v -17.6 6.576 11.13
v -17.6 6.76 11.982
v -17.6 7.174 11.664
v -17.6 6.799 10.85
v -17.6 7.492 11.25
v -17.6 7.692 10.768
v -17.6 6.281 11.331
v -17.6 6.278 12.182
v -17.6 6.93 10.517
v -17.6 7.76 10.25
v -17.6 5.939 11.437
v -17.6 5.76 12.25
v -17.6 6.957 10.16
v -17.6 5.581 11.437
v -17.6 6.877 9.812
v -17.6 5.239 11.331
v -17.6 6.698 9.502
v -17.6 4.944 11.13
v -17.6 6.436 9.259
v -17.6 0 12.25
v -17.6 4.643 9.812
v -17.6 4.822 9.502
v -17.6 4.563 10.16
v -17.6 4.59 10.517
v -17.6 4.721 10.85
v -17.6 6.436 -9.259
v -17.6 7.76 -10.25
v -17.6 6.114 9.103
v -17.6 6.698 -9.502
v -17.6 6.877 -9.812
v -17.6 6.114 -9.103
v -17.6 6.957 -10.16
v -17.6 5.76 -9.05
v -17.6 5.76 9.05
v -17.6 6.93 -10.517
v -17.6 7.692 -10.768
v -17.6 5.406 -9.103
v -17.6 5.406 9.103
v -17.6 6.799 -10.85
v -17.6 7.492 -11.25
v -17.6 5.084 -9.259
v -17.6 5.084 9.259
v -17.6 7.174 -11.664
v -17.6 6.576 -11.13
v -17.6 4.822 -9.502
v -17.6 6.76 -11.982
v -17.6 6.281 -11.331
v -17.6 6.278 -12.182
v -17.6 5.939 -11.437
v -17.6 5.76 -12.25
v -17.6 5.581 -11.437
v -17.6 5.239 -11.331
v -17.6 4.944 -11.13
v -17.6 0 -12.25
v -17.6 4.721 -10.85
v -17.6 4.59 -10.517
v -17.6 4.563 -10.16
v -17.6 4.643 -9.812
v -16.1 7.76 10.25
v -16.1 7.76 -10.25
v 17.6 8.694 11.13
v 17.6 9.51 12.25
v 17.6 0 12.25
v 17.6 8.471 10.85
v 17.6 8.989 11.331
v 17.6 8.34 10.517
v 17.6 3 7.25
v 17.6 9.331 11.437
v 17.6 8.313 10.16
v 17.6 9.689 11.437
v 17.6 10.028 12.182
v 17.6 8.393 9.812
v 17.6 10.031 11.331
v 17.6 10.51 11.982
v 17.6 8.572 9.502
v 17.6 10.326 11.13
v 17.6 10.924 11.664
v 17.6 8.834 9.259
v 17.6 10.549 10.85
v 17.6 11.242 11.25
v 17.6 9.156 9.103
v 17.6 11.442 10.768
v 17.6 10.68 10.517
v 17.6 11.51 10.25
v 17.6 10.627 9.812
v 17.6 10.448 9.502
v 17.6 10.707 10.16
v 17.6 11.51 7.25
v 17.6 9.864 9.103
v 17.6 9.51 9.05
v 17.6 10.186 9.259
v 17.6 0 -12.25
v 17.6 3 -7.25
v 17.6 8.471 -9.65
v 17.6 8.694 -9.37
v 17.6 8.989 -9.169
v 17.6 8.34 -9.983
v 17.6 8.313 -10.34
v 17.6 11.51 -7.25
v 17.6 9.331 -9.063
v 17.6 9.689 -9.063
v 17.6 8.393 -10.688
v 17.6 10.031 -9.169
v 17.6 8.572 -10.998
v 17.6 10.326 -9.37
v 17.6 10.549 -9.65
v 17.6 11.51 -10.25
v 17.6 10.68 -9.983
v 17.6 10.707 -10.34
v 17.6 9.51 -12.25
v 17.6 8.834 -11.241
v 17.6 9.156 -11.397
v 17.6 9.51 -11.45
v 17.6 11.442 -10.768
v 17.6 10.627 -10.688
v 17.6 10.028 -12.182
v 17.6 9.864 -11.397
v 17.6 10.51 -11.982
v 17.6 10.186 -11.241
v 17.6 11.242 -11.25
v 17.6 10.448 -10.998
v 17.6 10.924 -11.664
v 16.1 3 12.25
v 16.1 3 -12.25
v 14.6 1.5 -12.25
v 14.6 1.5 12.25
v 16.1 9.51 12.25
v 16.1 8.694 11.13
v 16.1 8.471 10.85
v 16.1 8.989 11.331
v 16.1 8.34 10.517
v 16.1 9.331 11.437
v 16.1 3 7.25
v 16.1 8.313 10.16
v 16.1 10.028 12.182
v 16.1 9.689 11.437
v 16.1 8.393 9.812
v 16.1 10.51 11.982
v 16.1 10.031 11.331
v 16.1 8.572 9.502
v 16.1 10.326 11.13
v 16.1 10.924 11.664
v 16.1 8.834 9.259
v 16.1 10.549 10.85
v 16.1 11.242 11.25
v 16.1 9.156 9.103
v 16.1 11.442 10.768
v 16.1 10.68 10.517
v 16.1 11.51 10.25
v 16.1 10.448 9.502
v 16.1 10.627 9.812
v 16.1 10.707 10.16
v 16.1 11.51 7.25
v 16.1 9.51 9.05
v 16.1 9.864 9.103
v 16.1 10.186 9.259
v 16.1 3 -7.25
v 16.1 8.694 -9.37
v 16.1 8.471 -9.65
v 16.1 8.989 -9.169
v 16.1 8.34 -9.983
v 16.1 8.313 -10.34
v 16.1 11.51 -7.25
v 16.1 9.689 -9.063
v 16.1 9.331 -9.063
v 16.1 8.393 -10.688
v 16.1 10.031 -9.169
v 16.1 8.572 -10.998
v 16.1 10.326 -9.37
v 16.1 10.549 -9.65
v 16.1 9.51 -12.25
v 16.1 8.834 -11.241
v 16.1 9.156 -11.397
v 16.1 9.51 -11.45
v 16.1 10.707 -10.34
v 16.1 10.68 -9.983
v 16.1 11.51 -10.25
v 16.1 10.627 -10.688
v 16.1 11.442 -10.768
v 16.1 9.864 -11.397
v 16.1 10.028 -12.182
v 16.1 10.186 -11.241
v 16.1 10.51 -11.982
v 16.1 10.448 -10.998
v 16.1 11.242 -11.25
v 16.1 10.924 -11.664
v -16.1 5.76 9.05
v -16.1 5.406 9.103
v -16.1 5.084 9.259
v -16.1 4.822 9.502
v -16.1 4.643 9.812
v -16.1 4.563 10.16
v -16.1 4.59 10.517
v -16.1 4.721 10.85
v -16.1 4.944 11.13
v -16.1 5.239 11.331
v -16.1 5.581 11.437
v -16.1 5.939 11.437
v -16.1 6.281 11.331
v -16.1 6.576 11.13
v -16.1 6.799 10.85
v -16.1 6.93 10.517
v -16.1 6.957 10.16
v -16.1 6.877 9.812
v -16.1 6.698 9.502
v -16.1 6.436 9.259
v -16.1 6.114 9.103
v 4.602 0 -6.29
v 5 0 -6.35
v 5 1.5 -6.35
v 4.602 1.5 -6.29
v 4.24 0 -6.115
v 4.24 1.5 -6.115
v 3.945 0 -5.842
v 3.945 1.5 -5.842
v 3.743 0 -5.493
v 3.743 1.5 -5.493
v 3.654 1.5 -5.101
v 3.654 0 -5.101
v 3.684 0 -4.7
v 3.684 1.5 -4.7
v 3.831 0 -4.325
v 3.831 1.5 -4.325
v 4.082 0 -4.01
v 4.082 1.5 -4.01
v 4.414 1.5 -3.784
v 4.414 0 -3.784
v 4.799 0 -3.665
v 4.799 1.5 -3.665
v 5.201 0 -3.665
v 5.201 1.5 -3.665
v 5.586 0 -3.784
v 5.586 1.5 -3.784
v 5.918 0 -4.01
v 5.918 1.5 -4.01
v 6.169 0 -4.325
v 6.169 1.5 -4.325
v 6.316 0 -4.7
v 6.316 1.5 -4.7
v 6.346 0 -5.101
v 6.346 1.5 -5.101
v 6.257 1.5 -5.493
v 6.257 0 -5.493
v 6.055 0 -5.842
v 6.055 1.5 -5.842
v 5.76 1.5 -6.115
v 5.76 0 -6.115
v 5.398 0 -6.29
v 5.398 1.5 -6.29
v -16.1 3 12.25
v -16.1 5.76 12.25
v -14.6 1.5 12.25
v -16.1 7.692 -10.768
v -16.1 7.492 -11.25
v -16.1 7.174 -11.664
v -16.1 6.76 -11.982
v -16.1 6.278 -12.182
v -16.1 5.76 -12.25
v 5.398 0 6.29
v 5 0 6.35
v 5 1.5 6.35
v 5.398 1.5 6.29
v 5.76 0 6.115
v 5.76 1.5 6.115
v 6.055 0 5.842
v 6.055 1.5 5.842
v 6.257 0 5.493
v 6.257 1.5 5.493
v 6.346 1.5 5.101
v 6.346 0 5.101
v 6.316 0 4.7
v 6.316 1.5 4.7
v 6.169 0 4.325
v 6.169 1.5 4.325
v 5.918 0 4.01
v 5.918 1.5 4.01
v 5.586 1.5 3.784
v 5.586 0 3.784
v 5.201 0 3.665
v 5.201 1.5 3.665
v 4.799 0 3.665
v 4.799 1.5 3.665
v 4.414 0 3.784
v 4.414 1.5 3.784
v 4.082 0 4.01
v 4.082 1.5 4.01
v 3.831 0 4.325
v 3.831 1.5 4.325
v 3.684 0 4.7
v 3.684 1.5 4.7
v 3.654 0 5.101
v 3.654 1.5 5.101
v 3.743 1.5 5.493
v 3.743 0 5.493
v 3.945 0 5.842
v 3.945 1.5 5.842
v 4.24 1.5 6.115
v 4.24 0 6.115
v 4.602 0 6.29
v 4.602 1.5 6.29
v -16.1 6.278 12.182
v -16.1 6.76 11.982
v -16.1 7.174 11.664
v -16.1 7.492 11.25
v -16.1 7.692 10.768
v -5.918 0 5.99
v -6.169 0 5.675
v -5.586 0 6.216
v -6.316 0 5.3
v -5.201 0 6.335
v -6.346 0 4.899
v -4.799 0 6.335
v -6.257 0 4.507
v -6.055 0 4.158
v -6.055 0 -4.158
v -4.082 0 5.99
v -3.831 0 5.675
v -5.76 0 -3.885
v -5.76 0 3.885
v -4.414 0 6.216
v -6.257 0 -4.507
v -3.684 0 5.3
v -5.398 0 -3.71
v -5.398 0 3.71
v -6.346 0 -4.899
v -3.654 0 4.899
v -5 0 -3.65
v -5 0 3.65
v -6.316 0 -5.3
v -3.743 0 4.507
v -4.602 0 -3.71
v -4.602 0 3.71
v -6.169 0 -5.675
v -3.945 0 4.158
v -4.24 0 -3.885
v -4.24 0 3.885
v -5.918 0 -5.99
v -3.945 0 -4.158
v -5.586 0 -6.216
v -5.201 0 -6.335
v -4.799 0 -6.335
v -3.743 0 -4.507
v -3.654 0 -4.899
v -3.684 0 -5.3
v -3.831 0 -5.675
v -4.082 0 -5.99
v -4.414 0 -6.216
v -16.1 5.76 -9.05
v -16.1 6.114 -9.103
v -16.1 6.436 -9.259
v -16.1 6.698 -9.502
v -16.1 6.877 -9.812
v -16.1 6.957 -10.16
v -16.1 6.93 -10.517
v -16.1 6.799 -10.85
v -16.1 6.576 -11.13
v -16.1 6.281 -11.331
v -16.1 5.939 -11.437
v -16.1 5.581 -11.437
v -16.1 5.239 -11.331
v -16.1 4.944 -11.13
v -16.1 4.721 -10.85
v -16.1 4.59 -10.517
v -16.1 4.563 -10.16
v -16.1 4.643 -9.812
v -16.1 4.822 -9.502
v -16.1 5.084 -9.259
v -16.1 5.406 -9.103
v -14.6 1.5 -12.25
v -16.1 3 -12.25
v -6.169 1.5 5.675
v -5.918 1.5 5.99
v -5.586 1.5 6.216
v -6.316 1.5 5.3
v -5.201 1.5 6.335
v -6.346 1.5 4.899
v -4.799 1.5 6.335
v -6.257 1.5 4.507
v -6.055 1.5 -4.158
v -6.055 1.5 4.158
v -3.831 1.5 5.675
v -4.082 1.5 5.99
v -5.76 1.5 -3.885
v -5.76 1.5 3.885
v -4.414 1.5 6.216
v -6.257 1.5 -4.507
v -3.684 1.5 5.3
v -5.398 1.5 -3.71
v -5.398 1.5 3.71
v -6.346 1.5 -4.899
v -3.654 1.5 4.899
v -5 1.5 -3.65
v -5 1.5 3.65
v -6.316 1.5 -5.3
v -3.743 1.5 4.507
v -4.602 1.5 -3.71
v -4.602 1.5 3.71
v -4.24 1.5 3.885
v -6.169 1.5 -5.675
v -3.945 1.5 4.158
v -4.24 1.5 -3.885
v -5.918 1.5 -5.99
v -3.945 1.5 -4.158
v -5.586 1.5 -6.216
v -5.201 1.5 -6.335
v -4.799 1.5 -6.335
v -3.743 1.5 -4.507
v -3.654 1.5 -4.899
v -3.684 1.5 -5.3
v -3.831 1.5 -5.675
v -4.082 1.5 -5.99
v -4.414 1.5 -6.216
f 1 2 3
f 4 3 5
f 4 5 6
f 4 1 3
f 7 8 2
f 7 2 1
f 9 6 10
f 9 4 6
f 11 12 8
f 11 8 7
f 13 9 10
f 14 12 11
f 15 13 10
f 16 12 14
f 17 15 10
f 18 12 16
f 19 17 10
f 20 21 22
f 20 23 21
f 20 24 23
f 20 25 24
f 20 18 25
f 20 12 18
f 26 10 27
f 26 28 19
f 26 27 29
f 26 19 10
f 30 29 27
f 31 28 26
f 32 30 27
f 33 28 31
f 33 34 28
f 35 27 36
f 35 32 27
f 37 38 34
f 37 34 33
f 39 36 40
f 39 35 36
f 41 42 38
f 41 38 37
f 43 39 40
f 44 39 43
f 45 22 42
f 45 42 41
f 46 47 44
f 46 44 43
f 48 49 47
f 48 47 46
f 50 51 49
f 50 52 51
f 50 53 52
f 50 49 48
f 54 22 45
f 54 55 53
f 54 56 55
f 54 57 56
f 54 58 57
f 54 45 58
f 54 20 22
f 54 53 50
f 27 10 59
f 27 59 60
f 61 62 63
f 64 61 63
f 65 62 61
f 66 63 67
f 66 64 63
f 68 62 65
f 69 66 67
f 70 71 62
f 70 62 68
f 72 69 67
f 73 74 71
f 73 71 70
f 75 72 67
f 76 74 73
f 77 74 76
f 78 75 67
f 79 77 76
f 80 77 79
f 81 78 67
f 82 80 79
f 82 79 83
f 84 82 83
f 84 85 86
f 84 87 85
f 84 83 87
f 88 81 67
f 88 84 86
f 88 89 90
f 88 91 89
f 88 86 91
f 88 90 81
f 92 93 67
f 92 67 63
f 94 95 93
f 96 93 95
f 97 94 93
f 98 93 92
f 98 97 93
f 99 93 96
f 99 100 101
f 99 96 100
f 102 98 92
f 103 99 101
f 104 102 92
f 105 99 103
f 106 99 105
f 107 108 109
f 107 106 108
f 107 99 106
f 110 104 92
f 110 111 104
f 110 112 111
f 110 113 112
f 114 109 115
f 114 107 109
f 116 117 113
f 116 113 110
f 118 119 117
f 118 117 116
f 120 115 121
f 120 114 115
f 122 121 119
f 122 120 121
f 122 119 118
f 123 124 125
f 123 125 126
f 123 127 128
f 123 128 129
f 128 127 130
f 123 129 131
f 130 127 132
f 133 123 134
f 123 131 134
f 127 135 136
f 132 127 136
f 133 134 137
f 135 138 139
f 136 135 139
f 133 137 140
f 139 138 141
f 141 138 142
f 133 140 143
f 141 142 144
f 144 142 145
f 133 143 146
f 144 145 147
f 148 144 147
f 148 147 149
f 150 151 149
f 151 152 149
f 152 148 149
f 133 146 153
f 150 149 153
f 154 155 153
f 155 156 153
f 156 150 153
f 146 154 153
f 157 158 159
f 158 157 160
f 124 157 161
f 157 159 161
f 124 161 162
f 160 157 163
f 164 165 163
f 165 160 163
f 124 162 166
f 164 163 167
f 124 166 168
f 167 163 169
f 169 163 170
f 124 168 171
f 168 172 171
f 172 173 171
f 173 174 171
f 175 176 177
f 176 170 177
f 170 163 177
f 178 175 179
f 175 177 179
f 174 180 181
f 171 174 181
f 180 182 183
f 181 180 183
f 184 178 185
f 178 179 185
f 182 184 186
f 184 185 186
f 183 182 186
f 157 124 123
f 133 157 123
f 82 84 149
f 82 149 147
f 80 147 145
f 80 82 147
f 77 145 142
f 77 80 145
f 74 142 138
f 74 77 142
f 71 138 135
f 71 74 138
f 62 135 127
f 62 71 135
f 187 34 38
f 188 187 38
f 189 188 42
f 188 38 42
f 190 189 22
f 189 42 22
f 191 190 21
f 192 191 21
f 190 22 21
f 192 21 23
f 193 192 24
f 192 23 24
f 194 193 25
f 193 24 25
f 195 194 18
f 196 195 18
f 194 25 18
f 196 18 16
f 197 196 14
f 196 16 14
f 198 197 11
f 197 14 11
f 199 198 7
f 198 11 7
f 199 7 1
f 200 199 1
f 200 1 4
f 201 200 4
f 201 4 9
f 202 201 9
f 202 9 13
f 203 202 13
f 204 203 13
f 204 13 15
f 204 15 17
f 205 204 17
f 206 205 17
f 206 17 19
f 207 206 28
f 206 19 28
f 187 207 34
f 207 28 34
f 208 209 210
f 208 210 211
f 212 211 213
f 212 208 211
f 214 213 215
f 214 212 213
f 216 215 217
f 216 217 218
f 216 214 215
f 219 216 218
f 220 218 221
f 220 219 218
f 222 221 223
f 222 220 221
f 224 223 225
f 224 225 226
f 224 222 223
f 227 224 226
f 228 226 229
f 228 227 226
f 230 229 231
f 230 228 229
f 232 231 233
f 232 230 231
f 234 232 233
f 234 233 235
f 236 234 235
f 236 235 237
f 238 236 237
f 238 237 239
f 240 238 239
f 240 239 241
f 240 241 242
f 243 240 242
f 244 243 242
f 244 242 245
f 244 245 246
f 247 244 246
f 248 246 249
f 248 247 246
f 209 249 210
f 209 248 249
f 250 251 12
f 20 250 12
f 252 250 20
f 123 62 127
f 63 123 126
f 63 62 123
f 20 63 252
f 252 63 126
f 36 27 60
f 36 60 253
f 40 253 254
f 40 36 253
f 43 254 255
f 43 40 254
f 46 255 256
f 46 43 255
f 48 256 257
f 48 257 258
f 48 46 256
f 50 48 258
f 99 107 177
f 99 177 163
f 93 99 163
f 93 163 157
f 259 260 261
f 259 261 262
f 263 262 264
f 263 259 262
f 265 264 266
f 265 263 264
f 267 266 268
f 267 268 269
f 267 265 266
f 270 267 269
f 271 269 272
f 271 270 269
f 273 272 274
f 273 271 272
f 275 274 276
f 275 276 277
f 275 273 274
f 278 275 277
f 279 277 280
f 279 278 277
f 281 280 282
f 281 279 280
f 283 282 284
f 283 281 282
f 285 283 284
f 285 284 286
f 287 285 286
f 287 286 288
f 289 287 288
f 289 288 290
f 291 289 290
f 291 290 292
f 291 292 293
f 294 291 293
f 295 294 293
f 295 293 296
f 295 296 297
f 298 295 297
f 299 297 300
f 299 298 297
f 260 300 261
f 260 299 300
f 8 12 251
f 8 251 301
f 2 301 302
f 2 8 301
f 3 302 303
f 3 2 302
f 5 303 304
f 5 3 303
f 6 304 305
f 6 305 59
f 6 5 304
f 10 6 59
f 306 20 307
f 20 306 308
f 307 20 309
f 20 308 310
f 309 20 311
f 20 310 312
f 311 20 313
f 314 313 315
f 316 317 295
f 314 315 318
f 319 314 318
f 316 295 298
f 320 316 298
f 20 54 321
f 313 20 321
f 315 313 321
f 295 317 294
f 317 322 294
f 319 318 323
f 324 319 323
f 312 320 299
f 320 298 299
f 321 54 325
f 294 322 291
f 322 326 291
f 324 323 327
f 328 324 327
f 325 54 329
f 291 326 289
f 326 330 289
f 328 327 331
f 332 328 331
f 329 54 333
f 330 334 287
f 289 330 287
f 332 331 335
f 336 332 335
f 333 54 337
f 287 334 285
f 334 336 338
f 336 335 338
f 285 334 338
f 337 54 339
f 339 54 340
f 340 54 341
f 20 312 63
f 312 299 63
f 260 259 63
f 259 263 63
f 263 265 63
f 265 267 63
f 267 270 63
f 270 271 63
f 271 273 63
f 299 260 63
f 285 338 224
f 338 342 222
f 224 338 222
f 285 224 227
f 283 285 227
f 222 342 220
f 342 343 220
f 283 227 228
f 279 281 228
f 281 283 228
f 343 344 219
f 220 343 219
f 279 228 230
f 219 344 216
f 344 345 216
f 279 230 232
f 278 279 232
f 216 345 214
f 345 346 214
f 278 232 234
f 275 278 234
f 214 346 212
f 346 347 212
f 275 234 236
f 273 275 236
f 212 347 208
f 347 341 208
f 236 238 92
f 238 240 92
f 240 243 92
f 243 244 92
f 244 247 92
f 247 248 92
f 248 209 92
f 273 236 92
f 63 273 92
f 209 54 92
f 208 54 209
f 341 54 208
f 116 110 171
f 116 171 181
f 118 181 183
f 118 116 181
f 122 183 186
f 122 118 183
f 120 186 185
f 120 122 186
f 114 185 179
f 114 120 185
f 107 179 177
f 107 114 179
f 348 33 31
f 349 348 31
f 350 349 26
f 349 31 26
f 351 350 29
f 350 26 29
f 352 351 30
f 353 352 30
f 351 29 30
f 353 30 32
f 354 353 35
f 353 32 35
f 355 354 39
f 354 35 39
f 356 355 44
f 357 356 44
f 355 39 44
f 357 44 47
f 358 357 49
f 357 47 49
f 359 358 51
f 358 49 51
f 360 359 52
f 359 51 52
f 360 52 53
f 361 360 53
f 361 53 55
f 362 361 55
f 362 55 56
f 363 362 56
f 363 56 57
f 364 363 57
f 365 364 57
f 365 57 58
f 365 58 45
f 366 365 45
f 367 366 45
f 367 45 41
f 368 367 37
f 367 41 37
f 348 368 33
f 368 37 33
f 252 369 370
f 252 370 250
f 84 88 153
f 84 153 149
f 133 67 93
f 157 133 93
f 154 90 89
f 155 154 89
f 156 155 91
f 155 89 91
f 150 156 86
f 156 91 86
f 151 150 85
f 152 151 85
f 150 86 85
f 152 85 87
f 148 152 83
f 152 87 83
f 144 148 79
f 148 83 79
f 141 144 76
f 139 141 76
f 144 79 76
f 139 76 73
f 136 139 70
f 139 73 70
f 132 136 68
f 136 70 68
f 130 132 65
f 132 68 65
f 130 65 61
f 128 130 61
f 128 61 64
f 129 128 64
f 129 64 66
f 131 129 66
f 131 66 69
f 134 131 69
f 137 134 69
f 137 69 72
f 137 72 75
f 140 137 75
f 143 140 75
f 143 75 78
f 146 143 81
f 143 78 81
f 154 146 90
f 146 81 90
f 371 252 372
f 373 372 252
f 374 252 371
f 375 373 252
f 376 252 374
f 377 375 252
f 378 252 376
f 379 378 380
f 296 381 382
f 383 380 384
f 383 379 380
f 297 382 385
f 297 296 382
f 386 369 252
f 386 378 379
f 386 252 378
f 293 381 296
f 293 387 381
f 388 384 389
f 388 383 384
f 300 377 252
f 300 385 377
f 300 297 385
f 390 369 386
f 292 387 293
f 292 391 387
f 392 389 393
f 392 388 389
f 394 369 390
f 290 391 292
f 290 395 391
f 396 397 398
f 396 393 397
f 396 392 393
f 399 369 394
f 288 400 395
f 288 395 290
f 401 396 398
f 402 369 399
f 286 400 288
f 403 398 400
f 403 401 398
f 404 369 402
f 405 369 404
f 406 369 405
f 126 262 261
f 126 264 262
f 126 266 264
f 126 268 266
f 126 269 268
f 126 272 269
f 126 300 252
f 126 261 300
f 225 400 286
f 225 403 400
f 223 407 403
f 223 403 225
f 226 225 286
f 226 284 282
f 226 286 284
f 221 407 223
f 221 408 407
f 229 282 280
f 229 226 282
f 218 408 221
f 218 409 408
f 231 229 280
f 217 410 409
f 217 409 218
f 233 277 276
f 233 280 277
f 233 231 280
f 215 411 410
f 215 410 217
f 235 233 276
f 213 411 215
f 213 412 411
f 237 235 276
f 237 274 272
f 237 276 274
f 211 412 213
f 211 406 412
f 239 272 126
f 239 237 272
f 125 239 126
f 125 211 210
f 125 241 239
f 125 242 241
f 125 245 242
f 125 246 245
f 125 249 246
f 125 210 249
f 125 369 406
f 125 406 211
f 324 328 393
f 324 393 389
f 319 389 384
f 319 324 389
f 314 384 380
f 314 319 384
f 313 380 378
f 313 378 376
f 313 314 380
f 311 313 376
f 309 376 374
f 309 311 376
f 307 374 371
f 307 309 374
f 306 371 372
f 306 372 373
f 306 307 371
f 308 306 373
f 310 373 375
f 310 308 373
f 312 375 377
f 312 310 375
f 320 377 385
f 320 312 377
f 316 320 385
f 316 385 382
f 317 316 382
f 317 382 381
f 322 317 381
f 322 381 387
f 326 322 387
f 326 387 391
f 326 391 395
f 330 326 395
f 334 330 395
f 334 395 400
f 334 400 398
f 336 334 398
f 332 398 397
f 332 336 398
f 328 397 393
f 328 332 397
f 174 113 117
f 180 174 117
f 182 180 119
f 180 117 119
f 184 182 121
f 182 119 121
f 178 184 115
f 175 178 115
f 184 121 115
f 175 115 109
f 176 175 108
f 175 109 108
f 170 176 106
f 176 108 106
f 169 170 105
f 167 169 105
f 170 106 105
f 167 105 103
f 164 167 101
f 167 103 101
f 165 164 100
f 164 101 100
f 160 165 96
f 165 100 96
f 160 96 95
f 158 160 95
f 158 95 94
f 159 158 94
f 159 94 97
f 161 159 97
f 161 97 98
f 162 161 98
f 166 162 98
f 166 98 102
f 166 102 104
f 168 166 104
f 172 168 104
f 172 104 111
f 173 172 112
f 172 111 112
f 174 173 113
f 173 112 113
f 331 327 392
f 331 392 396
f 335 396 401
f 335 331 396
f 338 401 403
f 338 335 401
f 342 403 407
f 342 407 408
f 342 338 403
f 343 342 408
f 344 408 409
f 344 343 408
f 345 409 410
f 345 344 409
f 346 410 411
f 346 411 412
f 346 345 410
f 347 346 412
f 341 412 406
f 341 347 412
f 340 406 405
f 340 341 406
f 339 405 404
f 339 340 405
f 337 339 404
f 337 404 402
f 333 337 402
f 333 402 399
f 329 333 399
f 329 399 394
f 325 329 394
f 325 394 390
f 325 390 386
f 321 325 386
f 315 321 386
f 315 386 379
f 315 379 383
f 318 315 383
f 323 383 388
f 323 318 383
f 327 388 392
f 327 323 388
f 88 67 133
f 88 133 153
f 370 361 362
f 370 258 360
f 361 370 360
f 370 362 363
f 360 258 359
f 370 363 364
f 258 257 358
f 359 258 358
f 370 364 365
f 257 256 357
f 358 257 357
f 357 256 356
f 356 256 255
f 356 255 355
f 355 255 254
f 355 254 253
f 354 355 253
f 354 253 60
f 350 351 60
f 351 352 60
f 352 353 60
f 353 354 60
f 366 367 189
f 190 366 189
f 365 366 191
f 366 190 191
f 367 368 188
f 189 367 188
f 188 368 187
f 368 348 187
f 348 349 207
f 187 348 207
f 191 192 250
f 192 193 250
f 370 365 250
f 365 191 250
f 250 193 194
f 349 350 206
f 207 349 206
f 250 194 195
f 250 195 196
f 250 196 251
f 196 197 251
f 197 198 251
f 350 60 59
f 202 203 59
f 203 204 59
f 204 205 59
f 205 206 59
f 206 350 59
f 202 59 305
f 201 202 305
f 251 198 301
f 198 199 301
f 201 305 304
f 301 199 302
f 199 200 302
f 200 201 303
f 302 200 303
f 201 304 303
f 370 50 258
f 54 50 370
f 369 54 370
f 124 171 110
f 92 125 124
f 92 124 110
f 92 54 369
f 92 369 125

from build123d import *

# Parameters (mm, degrees)
SKETCH1_W           = 35.2
SKETCH1_H           = 24.5
SKETCH1_R           = 1.35
BOSS_EXTRUDE1_DEPTH = 1.5
SKETCH2_R           = 1.2
SKETCH2_W           = 5
SKETCH2_H           = 1.5
SKETCH2_W_2         = 14.5
BOSS_EXTRUDE2_DEPTH = 1.5
SKETCH3_R           = 1.2
BOSS_EXTRUDE3_DEPTH = 1.5
CHAMFER1_SIZE       = 1.5


with BuildPart() as part:
    # Sketch1 → Boss-Extrude1 (new body)
    with BuildSketch(Plane(origin=(0, 0, 0), x_dir=(1, 0, 0), z_dir=(0, 1, 0))):
        Rectangle(SKETCH1_W, SKETCH1_H)
        with Locations(Location((-5, 5, 0), (0, 0, 270))):
            Circle(SKETCH1_R, mode=Mode.SUBTRACT)
        with Locations(Location((5, 5, 0), (0, 0, 90))):
            Circle(SKETCH1_R, mode=Mode.SUBTRACT)
        with Locations(Location((-5, -5, 0), (0, 0, 90))):
            Circle(SKETCH1_R, mode=Mode.SUBTRACT)
        with Locations(Location((5, -5, 0), (0, 0, 270))):
            Circle(SKETCH1_R, mode=Mode.SUBTRACT)
    extrude(amount=BOSS_EXTRUDE1_DEPTH)

    # Sketch2 → Boss-Extrude2 (add)
    # profile 1 of 6: a face of its own
    with BuildSketch(Plane(origin=(17.6, 0, 0), x_dir=(0, 0, -1), z_dir=(1, 0, 0))):
        with BuildLine():
            Line((-7.25, 1.5), (-7.25, 3))
            Line((-7.25, 3), (-7.25, 11.51))
            Line((-7.25, 11.51), (-10.25, 11.51))
            ThreePointArc((-10.25, 11.51), (-11.664213562, 10.924213562), (-12.25, 9.51))
            Line((-12.25, 9.51), (-12.25, 1.5))
            Line((-12.25, 1.5), (-7.25, 1.5))
        make_face()
        with Locations((-10.25, 9.51)):
            Circle(SKETCH2_R, mode=Mode.SUBTRACT)
    # profile 2 of 6: a face of its own
    with BuildSketch(Plane(origin=(17.6, 0, 0), x_dir=(0, 0, -1), z_dir=(1, 0, 0))):
        with Locations((-9.75, 0.75)):
            Rectangle(SKETCH2_W, SKETCH2_H)
    # profile 3 of 6: a face of its own
    with BuildSketch(Plane(origin=(17.6, 0, 0), x_dir=(0, 0, -1), z_dir=(1, 0, 0))):
        with Locations((0, 0.75)):
            Rectangle(SKETCH2_W_2, SKETCH2_H)
    # profile 4 of 6: a face of its own
    with BuildSketch(Plane(origin=(17.6, 0, 0), x_dir=(0, 0, -1), z_dir=(1, 0, 0))):
        with Locations((0, 2.25)):
            Rectangle(SKETCH2_W_2, SKETCH2_H)
    # profile 5 of 6: a face of its own
    with BuildSketch(Plane(origin=(17.6, 0, 0), x_dir=(0, 0, -1), z_dir=(1, 0, 0))):
        with Locations((9.75, 0.75)):
            Rectangle(SKETCH2_W, SKETCH2_H)
    # profile 6 of 6: a face of its own
    with BuildSketch(Plane(origin=(17.6, 0, 0), x_dir=(0, 0, -1), z_dir=(1, 0, 0))):
        with BuildLine():
            Line((7.25, 11.51), (7.25, 3))
            Line((7.25, 3), (7.25, 1.5))
            Line((7.25, 1.5), (12.25, 1.5))
            Line((12.25, 1.5), (12.25, 9.51))
            ThreePointArc((12.25, 9.51), (11.664213562, 10.924213562), (10.25, 11.51))
            Line((10.25, 11.51), (7.25, 11.51))
        make_face()
        with Locations((10.25, 9.51)):
            Circle(SKETCH2_R, mode=Mode.SUBTRACT)
    extrude(amount=-BOSS_EXTRUDE2_DEPTH)

    # Sketch3 → Boss-Extrude3 (add)
    with BuildSketch(Plane.ZY.offset(17.6)):
        with BuildLine():
            Line((-12.25, 0), (12.25, 0))
            Line((12.25, 0), (12.25, 5.76))
            ThreePointArc((12.25, 5.76), (11.664213562, 7.174213562), (10.25, 7.76))
            Line((10.25, 7.76), (-10.25, 7.76))
            ThreePointArc((-10.25, 7.76), (-11.664213562, 7.174213562), (-12.25, 5.76))
            Line((-12.25, 5.76), (-12.25, 0))
        make_face()
        with Locations((-10.25, 5.76)):
            Circle(SKETCH3_R, mode=Mode.SUBTRACT)
        with Locations(Location((10.25, 5.76, 0), (0, 0, 180))):
            Circle(SKETCH3_R, mode=Mode.SUBTRACT)
    extrude(amount=-BOSS_EXTRUDE3_DEPTH)

    # Chamfer1
    chamfer1_edges = [part.edges().sort_by_distance(p)[0] for p in [
        (16.1, 1.5, 0),
        (-16.1, 1.5, 0),
    ]]
    chamfer(chamfer1_edges, length=CHAMFER1_SIZE - 0.0001)  # a hair under: the kernel refuses the full size


solid = part.part
